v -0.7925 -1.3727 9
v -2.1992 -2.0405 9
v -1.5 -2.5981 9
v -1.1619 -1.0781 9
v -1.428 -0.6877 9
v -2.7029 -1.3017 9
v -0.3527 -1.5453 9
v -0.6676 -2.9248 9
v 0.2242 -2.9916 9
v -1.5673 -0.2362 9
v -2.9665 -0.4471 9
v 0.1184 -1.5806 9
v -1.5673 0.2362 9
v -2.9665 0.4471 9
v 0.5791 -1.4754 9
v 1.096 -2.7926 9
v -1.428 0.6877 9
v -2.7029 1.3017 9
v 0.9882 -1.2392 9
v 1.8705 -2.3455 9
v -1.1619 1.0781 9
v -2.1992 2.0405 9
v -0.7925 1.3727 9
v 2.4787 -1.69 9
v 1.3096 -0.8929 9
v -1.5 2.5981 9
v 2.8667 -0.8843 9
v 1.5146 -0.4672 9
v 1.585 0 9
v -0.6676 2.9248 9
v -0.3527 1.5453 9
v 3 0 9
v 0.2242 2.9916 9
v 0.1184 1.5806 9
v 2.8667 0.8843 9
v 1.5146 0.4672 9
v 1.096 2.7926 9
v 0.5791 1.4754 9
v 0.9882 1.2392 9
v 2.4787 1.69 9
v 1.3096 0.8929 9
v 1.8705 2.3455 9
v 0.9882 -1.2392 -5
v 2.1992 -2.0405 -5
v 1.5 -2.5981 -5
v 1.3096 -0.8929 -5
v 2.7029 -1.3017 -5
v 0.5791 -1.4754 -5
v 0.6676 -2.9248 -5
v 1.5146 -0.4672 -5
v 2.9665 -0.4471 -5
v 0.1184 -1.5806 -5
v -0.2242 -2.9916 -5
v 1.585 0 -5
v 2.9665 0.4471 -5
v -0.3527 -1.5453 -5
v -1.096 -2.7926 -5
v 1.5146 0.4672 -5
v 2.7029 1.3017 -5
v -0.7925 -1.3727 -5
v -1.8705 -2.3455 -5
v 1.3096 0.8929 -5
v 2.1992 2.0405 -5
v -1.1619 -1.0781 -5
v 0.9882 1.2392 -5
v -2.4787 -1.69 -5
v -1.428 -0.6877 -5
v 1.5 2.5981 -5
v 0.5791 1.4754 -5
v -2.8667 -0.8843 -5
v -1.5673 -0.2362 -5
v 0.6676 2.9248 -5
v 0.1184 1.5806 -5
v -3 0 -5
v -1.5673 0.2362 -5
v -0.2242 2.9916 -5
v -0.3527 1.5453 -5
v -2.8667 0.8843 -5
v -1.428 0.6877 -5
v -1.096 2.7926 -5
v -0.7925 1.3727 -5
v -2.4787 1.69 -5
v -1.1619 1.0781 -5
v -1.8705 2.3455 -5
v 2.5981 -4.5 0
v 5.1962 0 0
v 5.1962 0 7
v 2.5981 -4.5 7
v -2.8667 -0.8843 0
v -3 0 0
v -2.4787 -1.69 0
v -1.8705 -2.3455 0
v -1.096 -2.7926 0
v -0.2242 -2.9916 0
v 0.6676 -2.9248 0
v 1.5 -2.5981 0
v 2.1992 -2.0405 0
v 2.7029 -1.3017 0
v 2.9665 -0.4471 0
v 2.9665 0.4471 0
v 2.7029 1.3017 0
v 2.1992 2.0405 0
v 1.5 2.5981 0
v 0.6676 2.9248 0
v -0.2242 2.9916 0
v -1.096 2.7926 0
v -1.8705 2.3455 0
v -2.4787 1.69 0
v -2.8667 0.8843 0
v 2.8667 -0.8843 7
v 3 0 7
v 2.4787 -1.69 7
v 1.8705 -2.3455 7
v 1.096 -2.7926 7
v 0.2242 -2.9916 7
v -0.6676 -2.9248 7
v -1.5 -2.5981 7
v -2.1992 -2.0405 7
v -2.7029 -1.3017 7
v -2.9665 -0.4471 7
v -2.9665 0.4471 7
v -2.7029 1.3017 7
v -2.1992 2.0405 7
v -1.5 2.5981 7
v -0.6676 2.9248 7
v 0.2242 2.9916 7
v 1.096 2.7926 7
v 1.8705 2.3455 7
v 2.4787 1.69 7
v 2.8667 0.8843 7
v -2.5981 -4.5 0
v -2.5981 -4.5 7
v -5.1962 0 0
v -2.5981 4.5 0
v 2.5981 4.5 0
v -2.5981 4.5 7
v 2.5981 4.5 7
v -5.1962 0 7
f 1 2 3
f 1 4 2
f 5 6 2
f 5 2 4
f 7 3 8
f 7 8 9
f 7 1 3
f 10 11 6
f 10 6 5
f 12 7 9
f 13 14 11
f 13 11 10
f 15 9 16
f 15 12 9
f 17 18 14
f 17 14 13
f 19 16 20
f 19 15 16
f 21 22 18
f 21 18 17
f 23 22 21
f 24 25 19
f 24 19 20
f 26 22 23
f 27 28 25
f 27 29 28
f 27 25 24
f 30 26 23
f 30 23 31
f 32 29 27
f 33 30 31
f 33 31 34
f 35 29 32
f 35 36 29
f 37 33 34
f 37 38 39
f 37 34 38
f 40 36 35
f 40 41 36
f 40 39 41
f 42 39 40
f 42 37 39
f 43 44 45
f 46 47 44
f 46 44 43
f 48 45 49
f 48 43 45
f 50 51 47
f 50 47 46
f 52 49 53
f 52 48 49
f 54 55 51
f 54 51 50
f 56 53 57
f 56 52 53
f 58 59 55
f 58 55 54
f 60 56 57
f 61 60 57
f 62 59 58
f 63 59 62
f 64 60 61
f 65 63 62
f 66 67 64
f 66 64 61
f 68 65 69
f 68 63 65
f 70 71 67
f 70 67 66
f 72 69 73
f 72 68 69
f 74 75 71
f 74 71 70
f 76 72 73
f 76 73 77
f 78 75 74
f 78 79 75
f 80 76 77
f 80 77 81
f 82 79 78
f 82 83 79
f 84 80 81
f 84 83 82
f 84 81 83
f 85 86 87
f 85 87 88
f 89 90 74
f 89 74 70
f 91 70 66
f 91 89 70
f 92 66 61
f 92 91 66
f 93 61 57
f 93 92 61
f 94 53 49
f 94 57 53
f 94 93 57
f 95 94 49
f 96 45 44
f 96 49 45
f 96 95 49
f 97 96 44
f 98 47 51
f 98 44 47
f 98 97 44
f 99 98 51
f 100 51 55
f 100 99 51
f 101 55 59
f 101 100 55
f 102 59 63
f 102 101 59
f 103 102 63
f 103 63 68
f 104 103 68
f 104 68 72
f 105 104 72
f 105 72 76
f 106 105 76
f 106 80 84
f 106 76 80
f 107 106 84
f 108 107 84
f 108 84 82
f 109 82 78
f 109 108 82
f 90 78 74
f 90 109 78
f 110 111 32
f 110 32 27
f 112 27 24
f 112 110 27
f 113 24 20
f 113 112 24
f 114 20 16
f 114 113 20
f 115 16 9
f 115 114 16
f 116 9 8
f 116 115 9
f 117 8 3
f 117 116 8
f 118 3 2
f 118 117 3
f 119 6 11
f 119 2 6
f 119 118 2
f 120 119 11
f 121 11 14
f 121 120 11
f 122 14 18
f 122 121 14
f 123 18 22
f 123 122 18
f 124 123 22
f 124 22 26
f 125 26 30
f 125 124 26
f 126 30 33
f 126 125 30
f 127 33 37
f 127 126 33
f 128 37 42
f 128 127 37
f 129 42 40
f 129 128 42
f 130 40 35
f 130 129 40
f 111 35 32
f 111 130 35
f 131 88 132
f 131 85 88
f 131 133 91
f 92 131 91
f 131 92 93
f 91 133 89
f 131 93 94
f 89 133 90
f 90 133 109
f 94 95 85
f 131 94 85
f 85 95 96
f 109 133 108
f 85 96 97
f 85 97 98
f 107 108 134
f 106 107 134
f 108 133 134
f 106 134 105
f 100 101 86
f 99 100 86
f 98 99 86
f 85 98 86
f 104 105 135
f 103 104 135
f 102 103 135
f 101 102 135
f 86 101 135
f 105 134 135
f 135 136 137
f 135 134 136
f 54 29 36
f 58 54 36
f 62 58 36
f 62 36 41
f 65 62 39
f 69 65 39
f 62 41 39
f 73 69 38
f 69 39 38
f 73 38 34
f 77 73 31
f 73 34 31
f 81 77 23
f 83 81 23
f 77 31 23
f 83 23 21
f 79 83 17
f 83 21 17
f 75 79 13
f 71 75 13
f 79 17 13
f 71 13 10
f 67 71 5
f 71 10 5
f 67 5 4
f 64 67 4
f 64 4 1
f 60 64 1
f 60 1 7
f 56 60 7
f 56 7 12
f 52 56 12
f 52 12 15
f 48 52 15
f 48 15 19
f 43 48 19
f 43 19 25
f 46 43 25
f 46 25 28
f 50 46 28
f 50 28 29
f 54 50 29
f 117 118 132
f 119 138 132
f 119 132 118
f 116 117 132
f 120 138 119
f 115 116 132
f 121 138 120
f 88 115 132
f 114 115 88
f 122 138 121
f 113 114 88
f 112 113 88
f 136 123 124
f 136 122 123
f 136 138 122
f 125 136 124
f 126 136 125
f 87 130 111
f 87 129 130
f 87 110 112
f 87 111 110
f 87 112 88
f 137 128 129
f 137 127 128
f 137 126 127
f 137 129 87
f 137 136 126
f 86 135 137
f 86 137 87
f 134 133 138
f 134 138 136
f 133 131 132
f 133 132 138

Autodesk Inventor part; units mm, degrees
ref_plane "YZ Plane" through (0, 0, 0) normal (1, 0, 0) x (0, 1, 0)
ref_plane "XZ Plane" through (0, 0, 0) normal (0, 1, 0) x (-1, 0, 0)
ref_plane "XY Plane" through (0, 0, 0) normal (0, 0, 1) x (1, 0, 0)
sketch "Sketch1" plane through (0, 0, 0) normal (0, 0, 1) x (1, 0, 0)
  line L0 (-5.1962, 0) -> (-2.5981, 4.5)
  line L1 (-2.5981, 4.5) -> (2.5981, 4.5)
  line L2 (2.5981, 4.5) -> (5.1962, 0)
  line L3 (5.1962, 0) -> (2.5981, -4.5)
  line L4 (2.5981, -4.5) -> (-2.5981, -4.5)
  line L5 (-2.5981, -4.5) -> (-5.1962, 0)
  point P0 (0, 0)
  point P1 (0, 0)
  dimension "d0" = 9
extrude "Extrusion1" add sketch "Sketch1" along normal blind 7
sketch "Sketch2" plane through (0, 0, 7) normal (0, 0, 1) x (1, 0, 0)
  circle A0 centre (0, 0) radius 3
  dimension "d3" = 6
extrude "Extrusion2" add sketch "Sketch2" along normal blind 2
sketch "Sketch3" plane through (0, 0, 0) normal (0, 0, -1) x (-1, 0, 0)
  circle A0 centre (0, 0) radius 3
  dimension "d6" = 6
extrude "Extrusion3" add sketch "Sketch3" along normal blind 5
sketch "Sketch4" plane through (0, 0, 9) normal (0, 0, 1) x (1, 0, 0)
  circle A0 centre (0, 0) radius 1.585
  dimension "d9" = 3.17
extrude "Extrusion4" cut sketch "Sketch4" against normal through all
thread "Thread1" size "M6x1" class "6g" standard "ANSI Metric M Profile" full length
thread "Thread2" size "M6x1" class "6g" standard "ANSI Metric M Profile" full length
properties part number "mainBody" material "Nickel-Copper Alloy 400"
